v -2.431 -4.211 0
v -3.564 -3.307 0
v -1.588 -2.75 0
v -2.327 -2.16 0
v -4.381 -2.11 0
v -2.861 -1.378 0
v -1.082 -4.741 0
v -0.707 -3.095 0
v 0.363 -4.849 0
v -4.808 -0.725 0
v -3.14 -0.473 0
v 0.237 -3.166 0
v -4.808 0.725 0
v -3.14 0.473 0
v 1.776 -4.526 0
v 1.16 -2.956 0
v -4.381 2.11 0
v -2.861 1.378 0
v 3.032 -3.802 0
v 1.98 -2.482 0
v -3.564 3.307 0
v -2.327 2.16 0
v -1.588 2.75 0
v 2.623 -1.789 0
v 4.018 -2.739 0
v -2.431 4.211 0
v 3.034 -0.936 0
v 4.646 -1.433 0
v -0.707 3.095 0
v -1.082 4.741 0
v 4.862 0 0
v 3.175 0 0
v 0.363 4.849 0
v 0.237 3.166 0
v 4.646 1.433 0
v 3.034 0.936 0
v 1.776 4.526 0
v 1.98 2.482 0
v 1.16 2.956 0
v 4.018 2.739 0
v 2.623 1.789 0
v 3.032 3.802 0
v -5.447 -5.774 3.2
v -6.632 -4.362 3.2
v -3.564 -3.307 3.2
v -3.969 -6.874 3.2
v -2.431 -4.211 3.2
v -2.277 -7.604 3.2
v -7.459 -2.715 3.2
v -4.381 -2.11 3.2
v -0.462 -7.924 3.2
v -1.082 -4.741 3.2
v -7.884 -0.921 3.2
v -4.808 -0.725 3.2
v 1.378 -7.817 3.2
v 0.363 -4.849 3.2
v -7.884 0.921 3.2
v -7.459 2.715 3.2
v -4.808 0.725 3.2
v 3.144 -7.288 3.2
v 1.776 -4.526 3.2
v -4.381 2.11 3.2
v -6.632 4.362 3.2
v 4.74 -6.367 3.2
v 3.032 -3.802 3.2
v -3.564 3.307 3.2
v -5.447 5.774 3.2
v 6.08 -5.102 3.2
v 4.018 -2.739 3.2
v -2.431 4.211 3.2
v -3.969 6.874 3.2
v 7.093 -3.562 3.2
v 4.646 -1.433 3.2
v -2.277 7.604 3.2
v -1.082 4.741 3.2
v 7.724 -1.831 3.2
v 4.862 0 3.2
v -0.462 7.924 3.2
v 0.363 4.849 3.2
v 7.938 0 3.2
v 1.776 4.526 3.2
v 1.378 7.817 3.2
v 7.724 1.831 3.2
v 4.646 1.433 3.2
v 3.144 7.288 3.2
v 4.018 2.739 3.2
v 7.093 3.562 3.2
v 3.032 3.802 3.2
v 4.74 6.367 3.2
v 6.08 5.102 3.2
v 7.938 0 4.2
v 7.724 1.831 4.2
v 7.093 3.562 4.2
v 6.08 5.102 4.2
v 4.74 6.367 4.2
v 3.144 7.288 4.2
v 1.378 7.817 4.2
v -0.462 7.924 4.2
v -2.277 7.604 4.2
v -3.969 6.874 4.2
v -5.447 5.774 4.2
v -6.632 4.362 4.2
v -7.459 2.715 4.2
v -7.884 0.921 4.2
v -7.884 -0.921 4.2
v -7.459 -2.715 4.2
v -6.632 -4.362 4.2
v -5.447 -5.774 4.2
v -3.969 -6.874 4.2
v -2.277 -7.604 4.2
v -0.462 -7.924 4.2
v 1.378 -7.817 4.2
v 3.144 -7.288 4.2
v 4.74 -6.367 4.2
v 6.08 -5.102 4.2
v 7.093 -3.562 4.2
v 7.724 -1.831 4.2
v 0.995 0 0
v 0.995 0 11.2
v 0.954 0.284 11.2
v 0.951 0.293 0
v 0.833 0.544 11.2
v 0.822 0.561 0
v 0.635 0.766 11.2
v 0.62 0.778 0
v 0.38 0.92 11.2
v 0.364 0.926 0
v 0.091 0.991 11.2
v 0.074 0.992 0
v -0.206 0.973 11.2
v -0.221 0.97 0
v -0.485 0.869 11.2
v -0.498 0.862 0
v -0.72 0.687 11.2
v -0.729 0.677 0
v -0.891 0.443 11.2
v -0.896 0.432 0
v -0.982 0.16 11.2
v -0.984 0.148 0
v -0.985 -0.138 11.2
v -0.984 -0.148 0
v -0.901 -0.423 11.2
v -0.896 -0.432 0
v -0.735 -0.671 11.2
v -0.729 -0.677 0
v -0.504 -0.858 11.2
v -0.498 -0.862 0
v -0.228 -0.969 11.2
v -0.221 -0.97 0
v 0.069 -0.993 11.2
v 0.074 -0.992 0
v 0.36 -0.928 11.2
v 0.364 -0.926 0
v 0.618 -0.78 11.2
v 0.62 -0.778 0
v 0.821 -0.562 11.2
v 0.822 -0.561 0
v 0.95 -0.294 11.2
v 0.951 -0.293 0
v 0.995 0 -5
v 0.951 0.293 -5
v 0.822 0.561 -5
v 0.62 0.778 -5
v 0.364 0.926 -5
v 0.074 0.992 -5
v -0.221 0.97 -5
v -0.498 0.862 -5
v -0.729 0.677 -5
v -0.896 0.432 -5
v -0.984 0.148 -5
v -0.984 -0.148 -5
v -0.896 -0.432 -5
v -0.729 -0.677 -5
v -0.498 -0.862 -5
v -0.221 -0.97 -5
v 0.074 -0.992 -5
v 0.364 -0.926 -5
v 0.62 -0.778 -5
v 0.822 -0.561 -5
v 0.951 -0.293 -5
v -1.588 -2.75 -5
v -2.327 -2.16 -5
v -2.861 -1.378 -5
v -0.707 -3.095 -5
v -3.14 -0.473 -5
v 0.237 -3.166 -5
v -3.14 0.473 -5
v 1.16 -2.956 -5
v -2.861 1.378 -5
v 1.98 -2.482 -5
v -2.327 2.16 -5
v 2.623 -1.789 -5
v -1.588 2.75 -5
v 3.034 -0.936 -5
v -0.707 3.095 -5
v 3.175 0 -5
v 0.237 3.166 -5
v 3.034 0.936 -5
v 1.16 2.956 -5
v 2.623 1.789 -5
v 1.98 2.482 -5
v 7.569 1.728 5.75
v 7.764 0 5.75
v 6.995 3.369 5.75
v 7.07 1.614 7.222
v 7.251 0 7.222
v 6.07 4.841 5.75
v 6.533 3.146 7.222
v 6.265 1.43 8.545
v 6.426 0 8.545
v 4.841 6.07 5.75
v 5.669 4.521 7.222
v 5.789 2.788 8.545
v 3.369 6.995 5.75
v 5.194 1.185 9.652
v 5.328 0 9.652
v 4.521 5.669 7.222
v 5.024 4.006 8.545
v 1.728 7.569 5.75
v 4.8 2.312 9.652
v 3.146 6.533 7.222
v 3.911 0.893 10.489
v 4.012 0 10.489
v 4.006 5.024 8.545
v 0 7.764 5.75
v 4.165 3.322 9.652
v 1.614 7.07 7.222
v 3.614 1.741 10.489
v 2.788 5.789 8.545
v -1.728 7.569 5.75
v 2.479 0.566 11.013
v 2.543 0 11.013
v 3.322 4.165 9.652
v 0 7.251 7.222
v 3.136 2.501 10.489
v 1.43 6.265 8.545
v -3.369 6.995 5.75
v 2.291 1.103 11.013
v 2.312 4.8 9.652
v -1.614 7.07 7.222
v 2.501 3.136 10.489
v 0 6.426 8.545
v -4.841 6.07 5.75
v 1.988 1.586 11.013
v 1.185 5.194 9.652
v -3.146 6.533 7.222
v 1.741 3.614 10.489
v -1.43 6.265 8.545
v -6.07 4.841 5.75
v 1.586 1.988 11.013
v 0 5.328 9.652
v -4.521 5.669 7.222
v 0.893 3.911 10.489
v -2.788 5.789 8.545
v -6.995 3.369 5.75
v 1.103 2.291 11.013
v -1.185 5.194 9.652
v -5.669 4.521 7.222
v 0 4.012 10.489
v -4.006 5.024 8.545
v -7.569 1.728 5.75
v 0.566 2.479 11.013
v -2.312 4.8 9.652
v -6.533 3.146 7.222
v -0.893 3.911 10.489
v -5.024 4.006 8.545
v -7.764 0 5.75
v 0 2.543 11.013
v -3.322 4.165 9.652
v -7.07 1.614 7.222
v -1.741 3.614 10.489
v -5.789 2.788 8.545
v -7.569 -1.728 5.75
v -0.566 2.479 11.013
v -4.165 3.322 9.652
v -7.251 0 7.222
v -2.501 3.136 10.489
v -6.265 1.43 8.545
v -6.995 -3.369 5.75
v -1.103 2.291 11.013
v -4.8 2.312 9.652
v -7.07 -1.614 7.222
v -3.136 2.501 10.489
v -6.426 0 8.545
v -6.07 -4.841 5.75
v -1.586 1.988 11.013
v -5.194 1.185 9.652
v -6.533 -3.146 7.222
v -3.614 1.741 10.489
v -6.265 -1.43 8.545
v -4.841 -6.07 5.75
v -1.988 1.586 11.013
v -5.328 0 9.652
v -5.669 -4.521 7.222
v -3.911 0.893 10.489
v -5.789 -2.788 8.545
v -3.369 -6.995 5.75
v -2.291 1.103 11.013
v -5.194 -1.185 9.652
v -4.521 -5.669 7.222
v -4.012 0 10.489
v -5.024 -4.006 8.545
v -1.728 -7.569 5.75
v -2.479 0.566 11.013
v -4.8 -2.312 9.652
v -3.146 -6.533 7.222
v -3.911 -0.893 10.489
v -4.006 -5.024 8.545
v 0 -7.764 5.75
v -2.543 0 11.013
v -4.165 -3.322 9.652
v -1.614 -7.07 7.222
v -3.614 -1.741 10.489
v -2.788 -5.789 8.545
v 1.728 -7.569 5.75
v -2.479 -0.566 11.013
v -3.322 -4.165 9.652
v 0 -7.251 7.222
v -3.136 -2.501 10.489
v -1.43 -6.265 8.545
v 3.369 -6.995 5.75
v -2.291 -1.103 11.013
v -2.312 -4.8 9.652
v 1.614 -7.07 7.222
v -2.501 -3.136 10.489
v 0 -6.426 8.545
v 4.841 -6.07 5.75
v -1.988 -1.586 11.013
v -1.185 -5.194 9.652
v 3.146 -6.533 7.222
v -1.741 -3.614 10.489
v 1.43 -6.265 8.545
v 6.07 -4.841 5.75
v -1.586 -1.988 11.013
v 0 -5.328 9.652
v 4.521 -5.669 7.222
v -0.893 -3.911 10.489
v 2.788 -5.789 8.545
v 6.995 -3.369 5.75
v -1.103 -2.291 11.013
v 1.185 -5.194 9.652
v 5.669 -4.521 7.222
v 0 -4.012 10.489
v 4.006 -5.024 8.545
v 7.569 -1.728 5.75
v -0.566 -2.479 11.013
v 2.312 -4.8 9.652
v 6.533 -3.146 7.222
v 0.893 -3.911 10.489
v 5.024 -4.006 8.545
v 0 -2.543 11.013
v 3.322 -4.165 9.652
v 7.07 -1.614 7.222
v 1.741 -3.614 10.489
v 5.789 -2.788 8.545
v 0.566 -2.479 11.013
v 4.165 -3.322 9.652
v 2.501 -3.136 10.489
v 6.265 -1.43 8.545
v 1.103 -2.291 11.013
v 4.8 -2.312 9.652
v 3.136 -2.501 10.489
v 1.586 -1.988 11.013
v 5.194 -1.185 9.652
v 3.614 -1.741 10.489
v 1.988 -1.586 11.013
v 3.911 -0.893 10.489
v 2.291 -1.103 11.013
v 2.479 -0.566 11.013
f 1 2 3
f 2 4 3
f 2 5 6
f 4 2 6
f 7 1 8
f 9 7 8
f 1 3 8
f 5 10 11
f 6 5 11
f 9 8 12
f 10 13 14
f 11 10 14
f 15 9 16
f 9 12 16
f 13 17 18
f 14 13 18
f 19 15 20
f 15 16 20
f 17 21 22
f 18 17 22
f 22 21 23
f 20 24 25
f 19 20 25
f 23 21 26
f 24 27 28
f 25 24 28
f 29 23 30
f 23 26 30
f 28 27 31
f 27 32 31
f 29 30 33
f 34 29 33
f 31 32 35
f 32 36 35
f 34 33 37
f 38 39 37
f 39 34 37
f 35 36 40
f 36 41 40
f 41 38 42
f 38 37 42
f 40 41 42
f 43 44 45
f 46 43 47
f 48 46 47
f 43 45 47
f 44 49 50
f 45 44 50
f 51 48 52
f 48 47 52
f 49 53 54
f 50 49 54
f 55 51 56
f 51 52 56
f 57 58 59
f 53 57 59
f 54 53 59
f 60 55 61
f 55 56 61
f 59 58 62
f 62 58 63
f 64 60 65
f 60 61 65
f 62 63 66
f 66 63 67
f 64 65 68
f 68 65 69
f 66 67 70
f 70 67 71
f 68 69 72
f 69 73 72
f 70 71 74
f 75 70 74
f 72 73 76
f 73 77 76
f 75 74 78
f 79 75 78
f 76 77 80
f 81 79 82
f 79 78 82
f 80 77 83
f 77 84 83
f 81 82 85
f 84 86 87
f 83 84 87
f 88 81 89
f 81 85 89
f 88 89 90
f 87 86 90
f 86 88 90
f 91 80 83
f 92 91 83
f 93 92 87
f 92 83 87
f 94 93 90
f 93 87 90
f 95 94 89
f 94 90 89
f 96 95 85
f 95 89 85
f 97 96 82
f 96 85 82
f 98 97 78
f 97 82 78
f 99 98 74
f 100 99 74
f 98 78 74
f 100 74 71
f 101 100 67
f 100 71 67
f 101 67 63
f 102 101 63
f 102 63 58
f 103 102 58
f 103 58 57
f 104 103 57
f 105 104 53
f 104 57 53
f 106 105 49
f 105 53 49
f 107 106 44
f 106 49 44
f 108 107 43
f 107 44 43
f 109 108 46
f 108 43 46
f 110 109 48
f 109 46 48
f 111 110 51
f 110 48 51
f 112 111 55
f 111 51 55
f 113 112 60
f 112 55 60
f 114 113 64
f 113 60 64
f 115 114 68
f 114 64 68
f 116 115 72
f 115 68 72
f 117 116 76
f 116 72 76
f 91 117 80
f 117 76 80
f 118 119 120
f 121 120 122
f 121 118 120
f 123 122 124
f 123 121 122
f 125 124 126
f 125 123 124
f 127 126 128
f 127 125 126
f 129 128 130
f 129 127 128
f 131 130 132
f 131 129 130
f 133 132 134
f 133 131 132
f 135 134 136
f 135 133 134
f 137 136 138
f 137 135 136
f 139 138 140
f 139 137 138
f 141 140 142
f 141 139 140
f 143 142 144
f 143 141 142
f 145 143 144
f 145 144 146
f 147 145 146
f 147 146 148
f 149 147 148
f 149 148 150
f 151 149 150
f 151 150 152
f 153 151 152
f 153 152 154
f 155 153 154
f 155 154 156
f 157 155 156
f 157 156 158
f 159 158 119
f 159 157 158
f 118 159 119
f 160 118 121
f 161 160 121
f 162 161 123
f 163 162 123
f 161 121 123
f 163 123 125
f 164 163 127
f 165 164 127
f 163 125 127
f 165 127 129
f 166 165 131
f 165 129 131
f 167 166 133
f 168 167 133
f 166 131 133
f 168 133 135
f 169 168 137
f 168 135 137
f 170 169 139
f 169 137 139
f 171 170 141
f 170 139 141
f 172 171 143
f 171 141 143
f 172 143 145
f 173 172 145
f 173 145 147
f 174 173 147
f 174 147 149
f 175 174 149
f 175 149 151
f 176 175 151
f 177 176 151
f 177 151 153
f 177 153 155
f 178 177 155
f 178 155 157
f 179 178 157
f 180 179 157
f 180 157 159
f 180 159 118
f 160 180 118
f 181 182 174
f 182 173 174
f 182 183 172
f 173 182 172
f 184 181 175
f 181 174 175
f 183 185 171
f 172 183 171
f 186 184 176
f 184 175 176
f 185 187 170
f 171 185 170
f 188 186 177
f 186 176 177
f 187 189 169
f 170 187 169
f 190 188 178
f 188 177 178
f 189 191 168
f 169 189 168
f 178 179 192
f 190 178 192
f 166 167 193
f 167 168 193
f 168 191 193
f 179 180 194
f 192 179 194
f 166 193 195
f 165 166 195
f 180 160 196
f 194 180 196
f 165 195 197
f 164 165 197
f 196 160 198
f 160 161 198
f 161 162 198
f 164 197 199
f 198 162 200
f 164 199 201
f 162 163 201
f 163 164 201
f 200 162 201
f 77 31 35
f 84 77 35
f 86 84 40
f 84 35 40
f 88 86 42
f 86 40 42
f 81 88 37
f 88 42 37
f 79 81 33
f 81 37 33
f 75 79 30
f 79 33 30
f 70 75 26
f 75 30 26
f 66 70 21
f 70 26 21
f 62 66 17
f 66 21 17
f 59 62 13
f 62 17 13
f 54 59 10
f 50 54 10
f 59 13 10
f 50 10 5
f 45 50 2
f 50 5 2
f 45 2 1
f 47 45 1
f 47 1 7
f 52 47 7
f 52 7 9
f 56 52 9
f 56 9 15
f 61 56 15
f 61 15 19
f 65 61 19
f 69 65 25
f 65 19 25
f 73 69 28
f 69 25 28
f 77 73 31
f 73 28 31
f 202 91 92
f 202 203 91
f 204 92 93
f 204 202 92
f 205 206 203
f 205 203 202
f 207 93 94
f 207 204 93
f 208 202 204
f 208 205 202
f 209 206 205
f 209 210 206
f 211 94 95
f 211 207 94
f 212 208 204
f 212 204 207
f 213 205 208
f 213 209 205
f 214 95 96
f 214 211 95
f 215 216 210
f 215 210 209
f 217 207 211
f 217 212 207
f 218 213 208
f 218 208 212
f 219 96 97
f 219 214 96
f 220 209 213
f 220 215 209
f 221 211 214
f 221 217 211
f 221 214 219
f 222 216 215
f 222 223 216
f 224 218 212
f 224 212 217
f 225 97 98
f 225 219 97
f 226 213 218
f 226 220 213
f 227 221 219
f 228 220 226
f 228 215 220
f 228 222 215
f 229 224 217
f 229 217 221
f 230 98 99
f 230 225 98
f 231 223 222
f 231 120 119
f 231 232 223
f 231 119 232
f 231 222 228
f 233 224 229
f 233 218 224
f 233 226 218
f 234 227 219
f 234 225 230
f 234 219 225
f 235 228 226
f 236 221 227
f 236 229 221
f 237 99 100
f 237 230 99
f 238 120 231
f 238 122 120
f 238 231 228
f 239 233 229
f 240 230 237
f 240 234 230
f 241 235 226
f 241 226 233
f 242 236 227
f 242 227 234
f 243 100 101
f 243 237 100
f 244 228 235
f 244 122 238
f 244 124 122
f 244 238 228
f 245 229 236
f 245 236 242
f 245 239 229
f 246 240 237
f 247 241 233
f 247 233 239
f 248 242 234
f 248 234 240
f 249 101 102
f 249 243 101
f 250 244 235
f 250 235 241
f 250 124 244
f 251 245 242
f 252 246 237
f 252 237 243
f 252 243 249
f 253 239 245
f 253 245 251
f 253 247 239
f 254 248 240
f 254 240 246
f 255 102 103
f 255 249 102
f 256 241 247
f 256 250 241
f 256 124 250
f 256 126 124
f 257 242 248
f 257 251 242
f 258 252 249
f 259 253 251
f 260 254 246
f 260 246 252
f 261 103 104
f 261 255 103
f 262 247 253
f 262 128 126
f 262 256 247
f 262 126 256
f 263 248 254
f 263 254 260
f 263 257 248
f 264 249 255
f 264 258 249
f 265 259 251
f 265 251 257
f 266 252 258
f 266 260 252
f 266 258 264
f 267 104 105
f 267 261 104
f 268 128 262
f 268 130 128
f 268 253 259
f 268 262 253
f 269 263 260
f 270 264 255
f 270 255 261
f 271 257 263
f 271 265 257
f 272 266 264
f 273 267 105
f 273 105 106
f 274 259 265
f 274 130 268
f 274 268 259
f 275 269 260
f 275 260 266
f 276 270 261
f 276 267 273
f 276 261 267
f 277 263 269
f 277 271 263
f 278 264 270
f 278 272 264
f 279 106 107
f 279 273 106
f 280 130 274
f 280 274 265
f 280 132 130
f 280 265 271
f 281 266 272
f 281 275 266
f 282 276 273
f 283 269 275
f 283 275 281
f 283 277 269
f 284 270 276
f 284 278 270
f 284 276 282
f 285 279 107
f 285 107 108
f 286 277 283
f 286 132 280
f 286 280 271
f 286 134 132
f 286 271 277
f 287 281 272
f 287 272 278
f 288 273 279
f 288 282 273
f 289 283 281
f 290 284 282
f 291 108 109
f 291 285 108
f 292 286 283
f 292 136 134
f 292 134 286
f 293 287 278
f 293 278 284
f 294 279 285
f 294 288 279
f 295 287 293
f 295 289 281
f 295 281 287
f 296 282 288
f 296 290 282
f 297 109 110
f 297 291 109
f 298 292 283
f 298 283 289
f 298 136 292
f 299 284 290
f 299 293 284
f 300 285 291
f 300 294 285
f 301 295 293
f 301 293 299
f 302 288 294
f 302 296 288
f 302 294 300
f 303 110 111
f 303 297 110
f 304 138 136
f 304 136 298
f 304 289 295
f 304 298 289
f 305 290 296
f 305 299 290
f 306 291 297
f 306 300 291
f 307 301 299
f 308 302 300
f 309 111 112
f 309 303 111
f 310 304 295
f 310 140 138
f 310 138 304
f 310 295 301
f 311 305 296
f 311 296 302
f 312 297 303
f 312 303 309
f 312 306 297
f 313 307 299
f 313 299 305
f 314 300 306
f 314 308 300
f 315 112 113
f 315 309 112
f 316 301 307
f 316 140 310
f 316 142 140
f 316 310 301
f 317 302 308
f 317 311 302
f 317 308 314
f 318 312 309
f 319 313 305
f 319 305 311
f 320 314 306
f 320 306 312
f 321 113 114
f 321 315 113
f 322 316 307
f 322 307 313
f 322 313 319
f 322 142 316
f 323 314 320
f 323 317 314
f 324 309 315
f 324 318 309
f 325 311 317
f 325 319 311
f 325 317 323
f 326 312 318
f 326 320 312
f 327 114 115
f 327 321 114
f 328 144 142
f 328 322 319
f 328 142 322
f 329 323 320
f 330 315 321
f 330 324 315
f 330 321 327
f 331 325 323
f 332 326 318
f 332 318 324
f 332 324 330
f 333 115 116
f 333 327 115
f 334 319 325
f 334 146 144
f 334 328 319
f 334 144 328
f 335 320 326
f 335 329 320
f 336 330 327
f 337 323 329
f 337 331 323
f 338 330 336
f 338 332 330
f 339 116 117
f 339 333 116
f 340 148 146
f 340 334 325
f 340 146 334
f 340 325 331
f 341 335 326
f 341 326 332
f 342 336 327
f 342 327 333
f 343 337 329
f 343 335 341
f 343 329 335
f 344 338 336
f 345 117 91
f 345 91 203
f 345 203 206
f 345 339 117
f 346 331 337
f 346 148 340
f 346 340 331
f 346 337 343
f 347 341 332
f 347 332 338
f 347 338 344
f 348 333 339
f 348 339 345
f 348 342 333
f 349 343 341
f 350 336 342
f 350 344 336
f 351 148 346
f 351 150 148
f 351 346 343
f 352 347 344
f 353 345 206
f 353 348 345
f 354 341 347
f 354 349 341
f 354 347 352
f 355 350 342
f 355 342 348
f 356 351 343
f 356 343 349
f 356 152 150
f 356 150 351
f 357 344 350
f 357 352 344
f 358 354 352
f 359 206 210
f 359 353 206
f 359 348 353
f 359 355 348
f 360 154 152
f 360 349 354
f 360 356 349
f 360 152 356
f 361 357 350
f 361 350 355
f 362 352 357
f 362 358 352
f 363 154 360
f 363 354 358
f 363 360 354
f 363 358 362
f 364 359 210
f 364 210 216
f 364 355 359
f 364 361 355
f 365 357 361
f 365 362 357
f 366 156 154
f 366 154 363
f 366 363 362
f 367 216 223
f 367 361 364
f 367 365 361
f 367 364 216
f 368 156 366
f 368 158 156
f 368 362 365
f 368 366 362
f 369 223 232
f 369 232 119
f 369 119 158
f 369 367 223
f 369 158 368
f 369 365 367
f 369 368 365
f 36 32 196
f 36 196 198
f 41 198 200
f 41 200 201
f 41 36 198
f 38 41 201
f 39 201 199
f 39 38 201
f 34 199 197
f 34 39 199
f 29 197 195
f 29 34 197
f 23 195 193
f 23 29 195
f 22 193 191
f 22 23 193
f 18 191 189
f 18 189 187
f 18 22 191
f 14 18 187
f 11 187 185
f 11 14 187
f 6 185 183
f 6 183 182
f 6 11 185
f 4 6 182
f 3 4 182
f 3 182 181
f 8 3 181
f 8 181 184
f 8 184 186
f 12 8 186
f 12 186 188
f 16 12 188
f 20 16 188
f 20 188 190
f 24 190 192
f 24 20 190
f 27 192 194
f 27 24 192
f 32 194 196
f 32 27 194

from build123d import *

# Parameters (mm, degrees)
F0_R          = 4.8625
F1_DEPTH      = 3.2
F2_R          = 7.9375
F2_R_2        = 4.8625
F3_DEPTH      = 8
F4_R          = 7
F5_R          = 3.175
F6_DEPTH      = 5
F7_R          = 0.995
F8_DEPTH      = 25
F8_DEPTH_BACK = 25


with BuildPart() as f1:
    # F0 (on Top) → F1 (new body)
    with BuildSketch(Plane.XY):
        Circle(F0_R)
    extrude(amount=F1_DEPTH)

    # F2 (on face) → F3 (join)
    with BuildSketch(Plane.XY.offset(3.2)):
        Circle(F2_R)
        Circle(F2_R_2, mode=Mode.SUBTRACT)
        Circle(F2_R_2)
    extrude(amount=F3_DEPTH)

    # F4
    f4_edges = [f1.edges().sort_by_distance(p)[0] for p in [
        (-7.9375, 0, 11.2),
    ]]
    fillet(f4_edges, radius=F4_R)

    # F5 (on Top) → F6 (join)
    with BuildSketch(Plane.XY):
        Circle(F5_R)
    extrude(amount=-F6_DEPTH)

    # F7 (on Top) → F8 (cut, two sides)
    with BuildSketch(Plane.XY) as f8_sk:
        Circle(F7_R)
    extrude(amount=-F8_DEPTH, mode=Mode.SUBTRACT)
    extrude(f8_sk.sketch, amount=F8_DEPTH_BACK, mode=Mode.SUBTRACT)


solid = f1.part
